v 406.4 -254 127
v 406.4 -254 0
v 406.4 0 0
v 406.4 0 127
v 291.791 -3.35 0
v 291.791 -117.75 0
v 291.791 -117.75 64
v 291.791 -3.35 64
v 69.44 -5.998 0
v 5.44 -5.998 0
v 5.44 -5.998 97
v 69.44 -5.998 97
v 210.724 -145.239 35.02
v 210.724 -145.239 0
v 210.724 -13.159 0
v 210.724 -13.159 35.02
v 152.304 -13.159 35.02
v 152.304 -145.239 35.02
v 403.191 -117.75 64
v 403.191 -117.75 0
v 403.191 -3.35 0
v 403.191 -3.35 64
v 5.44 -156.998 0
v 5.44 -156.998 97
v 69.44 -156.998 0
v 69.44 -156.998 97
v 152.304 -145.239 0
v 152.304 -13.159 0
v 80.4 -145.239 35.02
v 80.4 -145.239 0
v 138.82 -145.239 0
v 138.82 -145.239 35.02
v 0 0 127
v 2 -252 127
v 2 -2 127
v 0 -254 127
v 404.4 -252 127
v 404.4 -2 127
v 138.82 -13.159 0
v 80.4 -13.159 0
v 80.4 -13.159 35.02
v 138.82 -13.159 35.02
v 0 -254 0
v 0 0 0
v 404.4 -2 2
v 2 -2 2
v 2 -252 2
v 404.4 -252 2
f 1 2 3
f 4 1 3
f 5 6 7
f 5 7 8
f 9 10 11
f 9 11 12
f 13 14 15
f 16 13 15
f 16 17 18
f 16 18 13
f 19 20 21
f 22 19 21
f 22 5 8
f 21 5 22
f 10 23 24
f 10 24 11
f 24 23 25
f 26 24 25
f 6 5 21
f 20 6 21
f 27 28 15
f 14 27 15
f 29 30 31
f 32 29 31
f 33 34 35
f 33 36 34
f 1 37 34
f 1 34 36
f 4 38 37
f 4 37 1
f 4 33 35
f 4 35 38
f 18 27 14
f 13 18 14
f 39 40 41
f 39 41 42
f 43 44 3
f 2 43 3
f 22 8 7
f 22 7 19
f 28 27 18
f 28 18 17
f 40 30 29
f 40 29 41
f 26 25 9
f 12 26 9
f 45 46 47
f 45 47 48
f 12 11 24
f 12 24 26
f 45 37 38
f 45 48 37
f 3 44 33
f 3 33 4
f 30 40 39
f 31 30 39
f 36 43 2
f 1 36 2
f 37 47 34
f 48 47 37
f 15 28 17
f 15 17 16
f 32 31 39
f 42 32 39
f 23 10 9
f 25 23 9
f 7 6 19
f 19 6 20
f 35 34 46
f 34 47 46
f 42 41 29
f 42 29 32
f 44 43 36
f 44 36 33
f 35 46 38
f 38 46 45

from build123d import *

# Parameters (mm, degrees)
SKETCH_W     = 406.4
SKETCH_H     = 254
PAD_DEPTH    = 127
THICKNESS_T  = -2
SKETCH001_W  = 111.4
SKETCH001_H  = 114.4
PAD001_DEPTH = 64
SKETCH002_W  = 64
SKETCH002_H  = 151
PAD002_DEPTH = 97
SKETCH003_W  = 58.42
SKETCH003_H  = 132.08
PAD003_DEPTH = 35.02
SKETCH004_W  = 58.42
SKETCH004_H  = 132.08
PAD004_DEPTH = 35.02


with BuildPart() as thickness:
    # Sketch → Pad (new body)
    with BuildSketch(Plane.XY):
        with Locations((203.2, -127)):
            Rectangle(SKETCH_W, SKETCH_H)
    extrude(amount=PAD_DEPTH)

    # Thickness
    thickness_openings = [thickness.faces().sort_by_distance(p)[0] for p in [
        (203.2, -127, 127),
    ]]
    offset(amount=THICKNESS_T, openings=thickness_openings)


with BuildPart() as brix:
    # Sketch001 → Pad001 (new body)
    with BuildSketch(Plane.XY):
        with Locations((347.491134, -60.549997)):
            Rectangle(SKETCH001_W, SKETCH001_H)
    extrude(amount=PAD001_DEPTH)


with BuildPart() as batteryupright:
    # Sketch002 → Pad002 (new body)
    with BuildSketch(Plane.XY):
        with Locations((37.439821, -81.497819)):
            Rectangle(SKETCH002_W, SKETCH002_H)
    extrude(amount=PAD002_DEPTH)


with BuildPart() as tenergycharger:
    # Sketch003 → Pad003 (new body)
    with BuildSketch(Plane.XY):
        with Locations((181.513722, -79.198551)):
            Rectangle(SKETCH003_W, SKETCH003_H)
    extrude(amount=PAD003_DEPTH)


with BuildPart() as brixadapterfacsimile:
    # Sketch004 → Pad004 (new body)
    with BuildSketch(Plane.XY):
        with Locations((109.61022, -79.198551)):
            Rectangle(SKETCH004_W, SKETCH004_H)
    extrude(amount=PAD004_DEPTH)


solid = Compound([thickness.part, brix.part, batteryupright.part, tenergycharger.part, brixadapterfacsimile.part])
